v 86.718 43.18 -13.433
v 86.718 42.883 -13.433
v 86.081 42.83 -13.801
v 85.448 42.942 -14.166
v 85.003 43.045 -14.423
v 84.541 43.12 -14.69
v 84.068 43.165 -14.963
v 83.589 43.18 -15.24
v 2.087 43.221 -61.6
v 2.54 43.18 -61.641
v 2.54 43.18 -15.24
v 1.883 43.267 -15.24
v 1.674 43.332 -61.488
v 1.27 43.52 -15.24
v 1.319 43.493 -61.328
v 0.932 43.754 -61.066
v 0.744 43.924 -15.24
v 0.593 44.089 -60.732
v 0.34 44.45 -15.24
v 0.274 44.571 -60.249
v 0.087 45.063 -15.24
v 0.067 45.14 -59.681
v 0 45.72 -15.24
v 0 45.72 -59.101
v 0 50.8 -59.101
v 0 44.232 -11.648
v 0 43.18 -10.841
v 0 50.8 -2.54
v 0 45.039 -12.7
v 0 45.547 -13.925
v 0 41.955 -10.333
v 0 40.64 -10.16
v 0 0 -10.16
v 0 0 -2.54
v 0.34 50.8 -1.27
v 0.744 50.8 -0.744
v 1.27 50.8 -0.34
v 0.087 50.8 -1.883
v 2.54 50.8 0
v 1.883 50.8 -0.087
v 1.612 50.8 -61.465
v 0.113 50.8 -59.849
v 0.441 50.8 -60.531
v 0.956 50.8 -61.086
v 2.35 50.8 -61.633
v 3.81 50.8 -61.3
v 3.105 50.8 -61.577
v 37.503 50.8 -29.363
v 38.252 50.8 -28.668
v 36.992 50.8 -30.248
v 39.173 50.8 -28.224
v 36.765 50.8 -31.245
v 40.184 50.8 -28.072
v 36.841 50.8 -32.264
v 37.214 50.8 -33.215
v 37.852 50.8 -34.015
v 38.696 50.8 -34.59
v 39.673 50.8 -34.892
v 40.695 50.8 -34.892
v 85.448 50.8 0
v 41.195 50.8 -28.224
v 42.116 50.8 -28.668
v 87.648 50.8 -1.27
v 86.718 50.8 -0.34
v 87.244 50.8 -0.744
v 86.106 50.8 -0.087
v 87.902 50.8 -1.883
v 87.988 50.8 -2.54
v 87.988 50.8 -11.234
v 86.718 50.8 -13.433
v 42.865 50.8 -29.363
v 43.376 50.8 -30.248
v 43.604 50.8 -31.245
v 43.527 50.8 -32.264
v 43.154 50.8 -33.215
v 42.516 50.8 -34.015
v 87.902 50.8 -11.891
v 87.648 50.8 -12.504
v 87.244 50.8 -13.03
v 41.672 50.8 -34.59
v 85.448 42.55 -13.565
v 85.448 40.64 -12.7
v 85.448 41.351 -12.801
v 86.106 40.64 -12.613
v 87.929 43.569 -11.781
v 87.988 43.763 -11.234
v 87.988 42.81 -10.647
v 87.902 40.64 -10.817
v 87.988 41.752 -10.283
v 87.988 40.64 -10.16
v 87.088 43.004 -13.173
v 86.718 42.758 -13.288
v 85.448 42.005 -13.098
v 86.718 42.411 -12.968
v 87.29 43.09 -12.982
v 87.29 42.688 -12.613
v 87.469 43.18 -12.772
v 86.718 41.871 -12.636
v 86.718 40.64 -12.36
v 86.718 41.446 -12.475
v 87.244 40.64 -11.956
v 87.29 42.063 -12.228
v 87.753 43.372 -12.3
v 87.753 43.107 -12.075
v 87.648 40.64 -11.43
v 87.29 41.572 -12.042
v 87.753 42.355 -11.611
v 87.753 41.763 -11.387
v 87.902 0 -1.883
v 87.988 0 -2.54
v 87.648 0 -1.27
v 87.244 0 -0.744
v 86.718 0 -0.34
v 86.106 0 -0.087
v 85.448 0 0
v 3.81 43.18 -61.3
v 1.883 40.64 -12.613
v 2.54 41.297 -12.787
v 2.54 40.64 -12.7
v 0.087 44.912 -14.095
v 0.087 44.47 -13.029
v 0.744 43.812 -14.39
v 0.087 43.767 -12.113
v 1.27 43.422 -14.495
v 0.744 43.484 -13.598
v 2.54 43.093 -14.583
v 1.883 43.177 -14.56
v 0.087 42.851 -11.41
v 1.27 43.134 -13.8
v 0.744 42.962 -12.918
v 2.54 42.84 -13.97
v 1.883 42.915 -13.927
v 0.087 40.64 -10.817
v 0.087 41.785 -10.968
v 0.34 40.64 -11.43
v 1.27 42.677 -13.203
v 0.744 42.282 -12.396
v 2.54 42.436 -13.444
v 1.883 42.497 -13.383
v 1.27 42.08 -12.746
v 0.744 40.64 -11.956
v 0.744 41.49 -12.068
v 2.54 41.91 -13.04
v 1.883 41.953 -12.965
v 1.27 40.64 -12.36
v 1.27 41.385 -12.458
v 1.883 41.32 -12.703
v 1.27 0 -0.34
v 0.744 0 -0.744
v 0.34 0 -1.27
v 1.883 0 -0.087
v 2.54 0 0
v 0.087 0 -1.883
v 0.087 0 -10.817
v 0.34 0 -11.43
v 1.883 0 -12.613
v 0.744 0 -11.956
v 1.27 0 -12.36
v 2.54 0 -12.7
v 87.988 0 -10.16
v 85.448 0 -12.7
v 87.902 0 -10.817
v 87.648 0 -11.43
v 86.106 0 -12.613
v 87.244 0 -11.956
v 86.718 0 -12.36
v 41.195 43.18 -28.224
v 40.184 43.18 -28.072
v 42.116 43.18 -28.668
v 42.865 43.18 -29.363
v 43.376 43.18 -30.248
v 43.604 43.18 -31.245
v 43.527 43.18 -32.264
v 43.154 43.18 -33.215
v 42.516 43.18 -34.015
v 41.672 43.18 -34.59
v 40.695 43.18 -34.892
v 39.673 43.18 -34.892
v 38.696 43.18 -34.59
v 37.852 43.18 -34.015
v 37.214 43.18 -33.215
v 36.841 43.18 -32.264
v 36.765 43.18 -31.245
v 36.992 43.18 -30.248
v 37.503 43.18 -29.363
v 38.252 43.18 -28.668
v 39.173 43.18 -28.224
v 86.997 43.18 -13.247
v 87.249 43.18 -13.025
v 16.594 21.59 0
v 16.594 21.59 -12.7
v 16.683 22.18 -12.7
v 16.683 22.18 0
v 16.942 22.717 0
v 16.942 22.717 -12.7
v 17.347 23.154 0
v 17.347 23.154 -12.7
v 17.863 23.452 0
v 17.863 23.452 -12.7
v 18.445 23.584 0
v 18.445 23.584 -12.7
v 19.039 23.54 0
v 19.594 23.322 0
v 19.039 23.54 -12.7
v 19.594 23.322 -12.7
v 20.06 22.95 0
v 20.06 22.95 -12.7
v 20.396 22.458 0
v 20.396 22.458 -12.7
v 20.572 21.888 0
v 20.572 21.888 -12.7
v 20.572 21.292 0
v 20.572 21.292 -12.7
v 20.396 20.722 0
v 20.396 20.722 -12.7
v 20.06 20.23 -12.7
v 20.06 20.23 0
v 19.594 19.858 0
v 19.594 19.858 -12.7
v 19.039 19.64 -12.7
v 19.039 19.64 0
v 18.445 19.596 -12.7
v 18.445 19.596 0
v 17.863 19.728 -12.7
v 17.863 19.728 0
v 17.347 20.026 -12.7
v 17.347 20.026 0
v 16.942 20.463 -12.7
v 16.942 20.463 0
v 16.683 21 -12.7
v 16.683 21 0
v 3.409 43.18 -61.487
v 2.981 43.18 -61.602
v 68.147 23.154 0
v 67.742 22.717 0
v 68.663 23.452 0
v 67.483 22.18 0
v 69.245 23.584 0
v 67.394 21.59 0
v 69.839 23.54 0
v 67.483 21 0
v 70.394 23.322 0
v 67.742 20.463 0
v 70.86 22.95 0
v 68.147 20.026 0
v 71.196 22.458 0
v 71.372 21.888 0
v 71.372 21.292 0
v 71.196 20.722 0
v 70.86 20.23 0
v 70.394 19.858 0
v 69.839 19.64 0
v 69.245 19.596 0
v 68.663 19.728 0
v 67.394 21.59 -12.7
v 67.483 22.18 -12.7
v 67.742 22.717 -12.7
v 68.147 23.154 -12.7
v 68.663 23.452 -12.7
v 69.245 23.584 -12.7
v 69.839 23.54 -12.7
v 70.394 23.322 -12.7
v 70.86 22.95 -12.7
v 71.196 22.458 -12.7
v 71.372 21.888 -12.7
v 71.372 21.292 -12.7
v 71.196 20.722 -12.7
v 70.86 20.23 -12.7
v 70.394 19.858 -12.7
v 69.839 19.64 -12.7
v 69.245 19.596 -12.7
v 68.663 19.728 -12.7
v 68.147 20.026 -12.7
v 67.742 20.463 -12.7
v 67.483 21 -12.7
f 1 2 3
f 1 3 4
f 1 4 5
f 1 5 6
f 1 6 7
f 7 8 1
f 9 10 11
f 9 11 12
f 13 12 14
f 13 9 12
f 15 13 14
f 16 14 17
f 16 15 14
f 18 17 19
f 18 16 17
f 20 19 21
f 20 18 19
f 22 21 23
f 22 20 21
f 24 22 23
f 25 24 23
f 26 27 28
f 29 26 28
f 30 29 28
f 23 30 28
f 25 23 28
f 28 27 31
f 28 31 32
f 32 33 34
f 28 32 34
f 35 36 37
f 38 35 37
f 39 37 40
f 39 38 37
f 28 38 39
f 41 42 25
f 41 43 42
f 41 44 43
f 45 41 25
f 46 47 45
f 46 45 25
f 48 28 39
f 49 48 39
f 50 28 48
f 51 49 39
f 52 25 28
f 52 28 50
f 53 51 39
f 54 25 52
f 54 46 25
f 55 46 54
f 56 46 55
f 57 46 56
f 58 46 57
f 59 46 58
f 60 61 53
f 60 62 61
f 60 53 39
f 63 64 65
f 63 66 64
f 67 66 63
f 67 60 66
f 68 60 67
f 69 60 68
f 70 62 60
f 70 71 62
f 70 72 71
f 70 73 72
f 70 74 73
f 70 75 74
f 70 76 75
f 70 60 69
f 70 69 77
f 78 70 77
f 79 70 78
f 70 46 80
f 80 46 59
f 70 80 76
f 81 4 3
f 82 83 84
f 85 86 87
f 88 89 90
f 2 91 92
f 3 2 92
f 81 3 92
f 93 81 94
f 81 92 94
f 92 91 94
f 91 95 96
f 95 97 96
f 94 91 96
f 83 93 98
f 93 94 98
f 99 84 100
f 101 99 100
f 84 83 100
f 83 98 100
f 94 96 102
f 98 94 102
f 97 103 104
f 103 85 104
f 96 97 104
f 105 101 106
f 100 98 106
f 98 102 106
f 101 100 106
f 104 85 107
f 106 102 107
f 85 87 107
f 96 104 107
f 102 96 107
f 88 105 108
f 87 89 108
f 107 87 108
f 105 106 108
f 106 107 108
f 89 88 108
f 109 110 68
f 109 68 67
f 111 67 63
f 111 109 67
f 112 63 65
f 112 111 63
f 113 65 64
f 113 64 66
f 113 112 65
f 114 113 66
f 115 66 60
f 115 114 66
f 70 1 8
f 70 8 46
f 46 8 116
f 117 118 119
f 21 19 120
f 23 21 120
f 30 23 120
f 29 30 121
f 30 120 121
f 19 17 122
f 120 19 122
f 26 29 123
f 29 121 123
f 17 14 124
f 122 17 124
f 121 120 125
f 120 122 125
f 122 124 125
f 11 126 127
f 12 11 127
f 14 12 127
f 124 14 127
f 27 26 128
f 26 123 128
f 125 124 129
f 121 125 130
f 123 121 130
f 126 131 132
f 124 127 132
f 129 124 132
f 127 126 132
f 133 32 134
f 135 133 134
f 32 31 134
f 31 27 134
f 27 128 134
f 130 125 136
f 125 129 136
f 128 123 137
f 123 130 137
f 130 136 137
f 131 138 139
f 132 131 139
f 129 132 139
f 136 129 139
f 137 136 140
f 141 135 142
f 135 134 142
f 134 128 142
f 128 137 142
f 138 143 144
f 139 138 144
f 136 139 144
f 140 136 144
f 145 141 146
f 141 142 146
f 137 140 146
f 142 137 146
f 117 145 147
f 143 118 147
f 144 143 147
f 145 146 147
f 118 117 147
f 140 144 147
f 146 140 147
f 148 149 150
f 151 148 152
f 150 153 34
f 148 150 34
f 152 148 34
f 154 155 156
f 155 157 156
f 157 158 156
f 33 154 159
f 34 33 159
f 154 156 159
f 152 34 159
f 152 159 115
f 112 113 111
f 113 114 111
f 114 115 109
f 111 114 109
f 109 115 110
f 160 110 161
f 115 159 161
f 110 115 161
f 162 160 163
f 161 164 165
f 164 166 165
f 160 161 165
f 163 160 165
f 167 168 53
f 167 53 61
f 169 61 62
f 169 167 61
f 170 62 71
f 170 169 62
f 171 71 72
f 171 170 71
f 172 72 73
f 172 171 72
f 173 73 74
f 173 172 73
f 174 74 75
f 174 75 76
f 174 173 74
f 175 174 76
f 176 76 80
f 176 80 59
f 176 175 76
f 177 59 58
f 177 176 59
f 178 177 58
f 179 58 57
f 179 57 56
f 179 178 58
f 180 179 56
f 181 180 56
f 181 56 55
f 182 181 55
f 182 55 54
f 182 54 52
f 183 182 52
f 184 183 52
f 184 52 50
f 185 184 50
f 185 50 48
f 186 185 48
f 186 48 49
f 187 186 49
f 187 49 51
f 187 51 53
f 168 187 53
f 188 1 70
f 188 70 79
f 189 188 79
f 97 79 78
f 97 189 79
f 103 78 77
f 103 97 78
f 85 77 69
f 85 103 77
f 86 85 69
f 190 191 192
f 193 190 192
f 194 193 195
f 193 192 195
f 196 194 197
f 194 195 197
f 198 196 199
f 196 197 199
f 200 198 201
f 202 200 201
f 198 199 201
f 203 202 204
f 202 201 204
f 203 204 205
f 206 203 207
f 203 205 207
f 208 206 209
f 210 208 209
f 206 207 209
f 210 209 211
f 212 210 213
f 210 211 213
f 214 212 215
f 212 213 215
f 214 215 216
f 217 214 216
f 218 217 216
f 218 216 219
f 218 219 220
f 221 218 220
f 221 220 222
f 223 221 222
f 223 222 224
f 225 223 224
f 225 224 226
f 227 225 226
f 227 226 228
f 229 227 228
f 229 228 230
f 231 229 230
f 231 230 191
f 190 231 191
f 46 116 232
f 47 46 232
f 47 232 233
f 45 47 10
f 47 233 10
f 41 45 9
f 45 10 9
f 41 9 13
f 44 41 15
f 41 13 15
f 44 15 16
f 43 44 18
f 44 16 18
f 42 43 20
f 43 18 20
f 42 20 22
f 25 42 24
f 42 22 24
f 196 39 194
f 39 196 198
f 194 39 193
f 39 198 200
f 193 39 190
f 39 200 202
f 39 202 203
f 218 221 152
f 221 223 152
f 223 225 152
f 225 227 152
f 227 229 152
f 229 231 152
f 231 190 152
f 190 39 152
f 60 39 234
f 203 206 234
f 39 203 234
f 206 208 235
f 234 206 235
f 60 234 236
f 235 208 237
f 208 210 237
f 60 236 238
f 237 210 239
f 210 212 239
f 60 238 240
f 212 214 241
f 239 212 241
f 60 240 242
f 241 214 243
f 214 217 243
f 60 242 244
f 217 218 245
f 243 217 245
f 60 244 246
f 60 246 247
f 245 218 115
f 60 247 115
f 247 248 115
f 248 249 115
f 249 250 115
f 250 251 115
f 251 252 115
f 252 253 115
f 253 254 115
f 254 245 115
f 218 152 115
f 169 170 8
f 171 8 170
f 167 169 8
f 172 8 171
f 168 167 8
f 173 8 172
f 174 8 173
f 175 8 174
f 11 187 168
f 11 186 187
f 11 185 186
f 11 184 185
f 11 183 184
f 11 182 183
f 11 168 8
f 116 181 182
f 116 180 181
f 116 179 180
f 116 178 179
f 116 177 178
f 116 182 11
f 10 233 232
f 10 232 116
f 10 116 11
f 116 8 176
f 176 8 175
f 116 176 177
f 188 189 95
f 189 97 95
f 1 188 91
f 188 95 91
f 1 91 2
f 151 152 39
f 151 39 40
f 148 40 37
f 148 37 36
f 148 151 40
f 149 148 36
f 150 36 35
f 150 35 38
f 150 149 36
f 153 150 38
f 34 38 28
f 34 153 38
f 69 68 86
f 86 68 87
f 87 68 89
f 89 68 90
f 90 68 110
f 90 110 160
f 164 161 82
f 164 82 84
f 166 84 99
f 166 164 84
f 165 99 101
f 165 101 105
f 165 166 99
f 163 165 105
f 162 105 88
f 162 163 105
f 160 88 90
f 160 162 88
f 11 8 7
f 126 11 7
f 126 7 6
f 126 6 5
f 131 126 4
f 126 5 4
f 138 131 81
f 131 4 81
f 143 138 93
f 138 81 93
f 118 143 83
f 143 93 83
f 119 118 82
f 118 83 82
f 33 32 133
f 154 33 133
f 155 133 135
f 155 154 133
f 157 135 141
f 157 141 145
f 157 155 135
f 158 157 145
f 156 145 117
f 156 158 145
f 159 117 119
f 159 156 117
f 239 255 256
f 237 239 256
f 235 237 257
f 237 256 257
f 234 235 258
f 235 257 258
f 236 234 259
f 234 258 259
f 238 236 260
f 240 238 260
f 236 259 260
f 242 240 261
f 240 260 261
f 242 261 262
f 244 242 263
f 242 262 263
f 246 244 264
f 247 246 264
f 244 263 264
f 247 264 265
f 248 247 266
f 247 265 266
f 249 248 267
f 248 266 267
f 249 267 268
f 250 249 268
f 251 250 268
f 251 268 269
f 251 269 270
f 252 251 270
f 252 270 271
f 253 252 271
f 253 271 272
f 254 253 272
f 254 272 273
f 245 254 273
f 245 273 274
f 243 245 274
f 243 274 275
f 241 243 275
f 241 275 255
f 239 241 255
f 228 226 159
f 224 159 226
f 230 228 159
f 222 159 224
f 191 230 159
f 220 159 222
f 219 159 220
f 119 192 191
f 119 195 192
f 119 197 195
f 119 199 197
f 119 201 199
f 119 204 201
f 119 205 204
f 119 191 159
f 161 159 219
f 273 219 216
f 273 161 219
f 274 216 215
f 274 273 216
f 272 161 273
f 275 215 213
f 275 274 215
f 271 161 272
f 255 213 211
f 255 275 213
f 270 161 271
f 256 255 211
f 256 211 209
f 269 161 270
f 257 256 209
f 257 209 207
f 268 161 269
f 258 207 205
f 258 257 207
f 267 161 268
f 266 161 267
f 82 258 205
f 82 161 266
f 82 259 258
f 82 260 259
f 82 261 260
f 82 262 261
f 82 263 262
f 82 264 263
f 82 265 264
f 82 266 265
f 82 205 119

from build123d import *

# Parameters (mm, degrees)
SKETCH1_R           = 3.429
BOSS_EXTRUDE1_DEPTH = 50.8
SKETCH2_W           = 50.8
SKETCH2_H           = 43.18
CUT_EXTRUDE1_DEPTH  = 120.811560377
SKETCH3_R           = 2
CUT_EXTRUDE2_DEPTH  = 114.592253257
FILLET1_START       = -1
FILLET1_DEPTH       = 41.6399999
FILLET1_START_2     = 4.794504
FILLET1_2_DEPTH     = 47.205496
FILLET1_START_3     = 40.6399999
FILLET1_3_DEPTH     = 2.5400001
FILLET1_START_4     = -61.640591048
FILLET1_5_DEPTH     = 46.400591048


with BuildPart() as part:
    # Sketch1 → Boss-Extrude1 (new body)
    with BuildSketch(Plane(origin=(0, 0, 0), x_dir=(1, 0, 0), z_dir=(0, 1, 0))):
        Polygon((0, 0), (87.988181024, 0), (87.988181024, 12.7), (0, 63.5), align=None)
        with Locations(Location((40.184090512, 31.500886423, 0), (0, 0, 270))):
            Circle(SKETCH1_R, mode=Mode.SUBTRACT)
    extrude(amount=BOSS_EXTRUDE1_DEPTH)

    # Sketch2 → Cut-Extrude1 (cut, through all)
    with BuildSketch(Plane(origin=(87.988181024, 0, 0), x_dir=(0, 0, -1), z_dir=(1, 0, 0))):
        with Locations((38.1, 21.59)):
            Rectangle(SKETCH2_W, SKETCH2_H)
    extrude(amount=-CUT_EXTRUDE1_DEPTH, mode=Mode.SUBTRACT)

    # Sketch3 → Cut-Extrude2 (cut, through all)
    with BuildSketch(Plane(origin=(0, 0, -12.7), x_dir=(-1, 0, 0), z_dir=(0, 0, -1))):
        with Locations((-69.394090512, 21.59)):
            Circle(SKETCH3_R)
        with Locations((-18.594090512, 21.59)):
            Circle(SKETCH3_R)
    extrude(amount=-CUT_EXTRUDE2_DEPTH, mode=Mode.SUBTRACT)

    # Fillet1: read off the stored shape, not the designer's step
    # Fillet1 outline → Fillet1 (cut)
    with BuildSketch(Plane(origin=(0, 0, 0), x_dir=(1, 0, 0), z_dir=(0, 1, 0)).offset(FILLET1_START)):
        with BuildLine():
            ThreePointArc((85.448181024, 12.7), (87.244232248, 11.956051225), (87.988181024, 10.16))
            Line((87.988181024, 10.16), (87.988181024, 12.7))
            Line((87.988181024, 12.7), (85.448181024, 12.7))
        make_face()
        with BuildLine():
            ThreePointArc((0, 10.16), (0.743948776, 11.956051224), (2.54, 12.7))
            Line((2.54, 12.7), (0, 12.7))
            Line((0, 12.7), (0, 10.16))
        make_face()
        with BuildLine():
            Line((87.988181024, 0), (87.988181024, 2.54))
            ThreePointArc((87.988181024, 2.54), (87.244232248, 0.743948775), (85.448181024, 0))
            Line((85.448181024, 0), (87.988181024, 0))
        make_face()
        with BuildLine():
            ThreePointArc((2.54, 0), (0.743948776, 0.743948776), (0, 2.54))
            Line((0, 2.54), (0, 0))
            Line((0, 0), (2.54, 0))
        make_face()
    extrude(amount=FILLET1_DEPTH, mode=Mode.SUBTRACT)

    # Fillet1 2 outline → Fillet1 2 (cut)
    with BuildSketch(Plane(origin=(0, 0, 0), x_dir=(1, 0, 0), z_dir=(0, 1, 0)).offset(FILLET1_START_2)):
        with BuildLine():
            Line((87.988181024, 11.233530316), (87.988181024, 12.7))
            Line((87.988181024, 12.7), (86.718181024, 13.433234842))
            ThreePointArc((86.718181024, 13.433234842), (87.64788555, 12.503530316), (87.988181024, 11.233530316))
        make_face()
        with BuildLine():
            Line((87.988181024, 0), (87.988181024, 2.54))
            ThreePointArc((87.988181024, 2.54), (87.244232248, 0.743948775), (85.448181024, 0))
            Line((85.448181024, 0), (87.988181024, 0))
        make_face()
        with BuildLine():
            ThreePointArc((2.54, 0), (0.743948776, 0.743948776), (0, 2.54))
            Line((0, 2.54), (0, 0))
            Line((0, 0), (2.54, 0))
        make_face()
        with BuildLine():
            Line((0, 63.5), (0, 59.100590949))
            ThreePointArc((0, 59.100590949), (1.27, 61.300295474), (3.81, 61.300295474))
            Line((3.81, 61.300295474), (0, 63.5))
        make_face()
    extrude(amount=FILLET1_2_DEPTH, mode=Mode.SUBTRACT)

    # Fillet1 3 outline → Fillet1 3 (add)
    with BuildSketch(Plane(origin=(0, 0, 0), x_dir=(1, 0, 0), z_dir=(0, 1, 0)).offset(FILLET1_START_3)):
        with BuildLine():
            Line((0, 12.7), (87.52208234, 12.7))
            ThreePointArc((87.52208234, 12.7), (87.159854864, 13.110168978), (86.718181024, 13.433234842))
            Line((86.718181024, 13.433234842), (3.81, 61.300295474))
            ThreePointArc((3.81, 61.300295474), (1.27, 61.300295474), (0, 59.100590949))
            Line((0, 59.100590949), (0, 12.7))
        make_face()
    extrude(amount=FILLET1_3_DEPTH)

    # Fillet1 4 outline → Fillet1 4 (revolve, cut)
    with BuildSketch(Plane(origin=(0, 40.64, -15.24), x_dir=(0, 1, 0), z_dir=(0, 0, -1))):
        with BuildLine():
            Line((5.08, 87.988181024), (0, 87.988181024))
            Line((0, 87.988181024), (0, 0))
            Line((0, 0), (5.08, 0))
            ThreePointArc((5.08, 0), (3.283948776, 0.743948776), (2.54, 2.54))
            Line((2.54, 2.54), (2.54, 85.448181024))
            ThreePointArc((2.54, 85.448181024), (3.283948775, 87.244232248), (5.08, 87.988181024))
        make_face()
    revolve(axis=Axis((0, 40.64, -15.24), (1, 0, 0)), mode=Mode.SUBTRACT)

    # Fillet1 5 outline → Fillet1 5 (cut)
    with BuildSketch(Plane.XY.offset(FILLET1_START_4)):
        with BuildLine():
            Line((85, 43.18), (2.54, 43.18))
            ThreePointArc((2.54, 43.18), (0.743948776, 43.923948776), (0, 45.72))
            Line((0, 45.72), (0, 40.6399999))
            Line((0, 40.6399999), (85, 40.6399999))
            Line((85, 40.6399999), (85, 43.18))
        make_face()
    extrude(amount=FILLET1_5_DEPTH, mode=Mode.SUBTRACT)


solid = part.part
